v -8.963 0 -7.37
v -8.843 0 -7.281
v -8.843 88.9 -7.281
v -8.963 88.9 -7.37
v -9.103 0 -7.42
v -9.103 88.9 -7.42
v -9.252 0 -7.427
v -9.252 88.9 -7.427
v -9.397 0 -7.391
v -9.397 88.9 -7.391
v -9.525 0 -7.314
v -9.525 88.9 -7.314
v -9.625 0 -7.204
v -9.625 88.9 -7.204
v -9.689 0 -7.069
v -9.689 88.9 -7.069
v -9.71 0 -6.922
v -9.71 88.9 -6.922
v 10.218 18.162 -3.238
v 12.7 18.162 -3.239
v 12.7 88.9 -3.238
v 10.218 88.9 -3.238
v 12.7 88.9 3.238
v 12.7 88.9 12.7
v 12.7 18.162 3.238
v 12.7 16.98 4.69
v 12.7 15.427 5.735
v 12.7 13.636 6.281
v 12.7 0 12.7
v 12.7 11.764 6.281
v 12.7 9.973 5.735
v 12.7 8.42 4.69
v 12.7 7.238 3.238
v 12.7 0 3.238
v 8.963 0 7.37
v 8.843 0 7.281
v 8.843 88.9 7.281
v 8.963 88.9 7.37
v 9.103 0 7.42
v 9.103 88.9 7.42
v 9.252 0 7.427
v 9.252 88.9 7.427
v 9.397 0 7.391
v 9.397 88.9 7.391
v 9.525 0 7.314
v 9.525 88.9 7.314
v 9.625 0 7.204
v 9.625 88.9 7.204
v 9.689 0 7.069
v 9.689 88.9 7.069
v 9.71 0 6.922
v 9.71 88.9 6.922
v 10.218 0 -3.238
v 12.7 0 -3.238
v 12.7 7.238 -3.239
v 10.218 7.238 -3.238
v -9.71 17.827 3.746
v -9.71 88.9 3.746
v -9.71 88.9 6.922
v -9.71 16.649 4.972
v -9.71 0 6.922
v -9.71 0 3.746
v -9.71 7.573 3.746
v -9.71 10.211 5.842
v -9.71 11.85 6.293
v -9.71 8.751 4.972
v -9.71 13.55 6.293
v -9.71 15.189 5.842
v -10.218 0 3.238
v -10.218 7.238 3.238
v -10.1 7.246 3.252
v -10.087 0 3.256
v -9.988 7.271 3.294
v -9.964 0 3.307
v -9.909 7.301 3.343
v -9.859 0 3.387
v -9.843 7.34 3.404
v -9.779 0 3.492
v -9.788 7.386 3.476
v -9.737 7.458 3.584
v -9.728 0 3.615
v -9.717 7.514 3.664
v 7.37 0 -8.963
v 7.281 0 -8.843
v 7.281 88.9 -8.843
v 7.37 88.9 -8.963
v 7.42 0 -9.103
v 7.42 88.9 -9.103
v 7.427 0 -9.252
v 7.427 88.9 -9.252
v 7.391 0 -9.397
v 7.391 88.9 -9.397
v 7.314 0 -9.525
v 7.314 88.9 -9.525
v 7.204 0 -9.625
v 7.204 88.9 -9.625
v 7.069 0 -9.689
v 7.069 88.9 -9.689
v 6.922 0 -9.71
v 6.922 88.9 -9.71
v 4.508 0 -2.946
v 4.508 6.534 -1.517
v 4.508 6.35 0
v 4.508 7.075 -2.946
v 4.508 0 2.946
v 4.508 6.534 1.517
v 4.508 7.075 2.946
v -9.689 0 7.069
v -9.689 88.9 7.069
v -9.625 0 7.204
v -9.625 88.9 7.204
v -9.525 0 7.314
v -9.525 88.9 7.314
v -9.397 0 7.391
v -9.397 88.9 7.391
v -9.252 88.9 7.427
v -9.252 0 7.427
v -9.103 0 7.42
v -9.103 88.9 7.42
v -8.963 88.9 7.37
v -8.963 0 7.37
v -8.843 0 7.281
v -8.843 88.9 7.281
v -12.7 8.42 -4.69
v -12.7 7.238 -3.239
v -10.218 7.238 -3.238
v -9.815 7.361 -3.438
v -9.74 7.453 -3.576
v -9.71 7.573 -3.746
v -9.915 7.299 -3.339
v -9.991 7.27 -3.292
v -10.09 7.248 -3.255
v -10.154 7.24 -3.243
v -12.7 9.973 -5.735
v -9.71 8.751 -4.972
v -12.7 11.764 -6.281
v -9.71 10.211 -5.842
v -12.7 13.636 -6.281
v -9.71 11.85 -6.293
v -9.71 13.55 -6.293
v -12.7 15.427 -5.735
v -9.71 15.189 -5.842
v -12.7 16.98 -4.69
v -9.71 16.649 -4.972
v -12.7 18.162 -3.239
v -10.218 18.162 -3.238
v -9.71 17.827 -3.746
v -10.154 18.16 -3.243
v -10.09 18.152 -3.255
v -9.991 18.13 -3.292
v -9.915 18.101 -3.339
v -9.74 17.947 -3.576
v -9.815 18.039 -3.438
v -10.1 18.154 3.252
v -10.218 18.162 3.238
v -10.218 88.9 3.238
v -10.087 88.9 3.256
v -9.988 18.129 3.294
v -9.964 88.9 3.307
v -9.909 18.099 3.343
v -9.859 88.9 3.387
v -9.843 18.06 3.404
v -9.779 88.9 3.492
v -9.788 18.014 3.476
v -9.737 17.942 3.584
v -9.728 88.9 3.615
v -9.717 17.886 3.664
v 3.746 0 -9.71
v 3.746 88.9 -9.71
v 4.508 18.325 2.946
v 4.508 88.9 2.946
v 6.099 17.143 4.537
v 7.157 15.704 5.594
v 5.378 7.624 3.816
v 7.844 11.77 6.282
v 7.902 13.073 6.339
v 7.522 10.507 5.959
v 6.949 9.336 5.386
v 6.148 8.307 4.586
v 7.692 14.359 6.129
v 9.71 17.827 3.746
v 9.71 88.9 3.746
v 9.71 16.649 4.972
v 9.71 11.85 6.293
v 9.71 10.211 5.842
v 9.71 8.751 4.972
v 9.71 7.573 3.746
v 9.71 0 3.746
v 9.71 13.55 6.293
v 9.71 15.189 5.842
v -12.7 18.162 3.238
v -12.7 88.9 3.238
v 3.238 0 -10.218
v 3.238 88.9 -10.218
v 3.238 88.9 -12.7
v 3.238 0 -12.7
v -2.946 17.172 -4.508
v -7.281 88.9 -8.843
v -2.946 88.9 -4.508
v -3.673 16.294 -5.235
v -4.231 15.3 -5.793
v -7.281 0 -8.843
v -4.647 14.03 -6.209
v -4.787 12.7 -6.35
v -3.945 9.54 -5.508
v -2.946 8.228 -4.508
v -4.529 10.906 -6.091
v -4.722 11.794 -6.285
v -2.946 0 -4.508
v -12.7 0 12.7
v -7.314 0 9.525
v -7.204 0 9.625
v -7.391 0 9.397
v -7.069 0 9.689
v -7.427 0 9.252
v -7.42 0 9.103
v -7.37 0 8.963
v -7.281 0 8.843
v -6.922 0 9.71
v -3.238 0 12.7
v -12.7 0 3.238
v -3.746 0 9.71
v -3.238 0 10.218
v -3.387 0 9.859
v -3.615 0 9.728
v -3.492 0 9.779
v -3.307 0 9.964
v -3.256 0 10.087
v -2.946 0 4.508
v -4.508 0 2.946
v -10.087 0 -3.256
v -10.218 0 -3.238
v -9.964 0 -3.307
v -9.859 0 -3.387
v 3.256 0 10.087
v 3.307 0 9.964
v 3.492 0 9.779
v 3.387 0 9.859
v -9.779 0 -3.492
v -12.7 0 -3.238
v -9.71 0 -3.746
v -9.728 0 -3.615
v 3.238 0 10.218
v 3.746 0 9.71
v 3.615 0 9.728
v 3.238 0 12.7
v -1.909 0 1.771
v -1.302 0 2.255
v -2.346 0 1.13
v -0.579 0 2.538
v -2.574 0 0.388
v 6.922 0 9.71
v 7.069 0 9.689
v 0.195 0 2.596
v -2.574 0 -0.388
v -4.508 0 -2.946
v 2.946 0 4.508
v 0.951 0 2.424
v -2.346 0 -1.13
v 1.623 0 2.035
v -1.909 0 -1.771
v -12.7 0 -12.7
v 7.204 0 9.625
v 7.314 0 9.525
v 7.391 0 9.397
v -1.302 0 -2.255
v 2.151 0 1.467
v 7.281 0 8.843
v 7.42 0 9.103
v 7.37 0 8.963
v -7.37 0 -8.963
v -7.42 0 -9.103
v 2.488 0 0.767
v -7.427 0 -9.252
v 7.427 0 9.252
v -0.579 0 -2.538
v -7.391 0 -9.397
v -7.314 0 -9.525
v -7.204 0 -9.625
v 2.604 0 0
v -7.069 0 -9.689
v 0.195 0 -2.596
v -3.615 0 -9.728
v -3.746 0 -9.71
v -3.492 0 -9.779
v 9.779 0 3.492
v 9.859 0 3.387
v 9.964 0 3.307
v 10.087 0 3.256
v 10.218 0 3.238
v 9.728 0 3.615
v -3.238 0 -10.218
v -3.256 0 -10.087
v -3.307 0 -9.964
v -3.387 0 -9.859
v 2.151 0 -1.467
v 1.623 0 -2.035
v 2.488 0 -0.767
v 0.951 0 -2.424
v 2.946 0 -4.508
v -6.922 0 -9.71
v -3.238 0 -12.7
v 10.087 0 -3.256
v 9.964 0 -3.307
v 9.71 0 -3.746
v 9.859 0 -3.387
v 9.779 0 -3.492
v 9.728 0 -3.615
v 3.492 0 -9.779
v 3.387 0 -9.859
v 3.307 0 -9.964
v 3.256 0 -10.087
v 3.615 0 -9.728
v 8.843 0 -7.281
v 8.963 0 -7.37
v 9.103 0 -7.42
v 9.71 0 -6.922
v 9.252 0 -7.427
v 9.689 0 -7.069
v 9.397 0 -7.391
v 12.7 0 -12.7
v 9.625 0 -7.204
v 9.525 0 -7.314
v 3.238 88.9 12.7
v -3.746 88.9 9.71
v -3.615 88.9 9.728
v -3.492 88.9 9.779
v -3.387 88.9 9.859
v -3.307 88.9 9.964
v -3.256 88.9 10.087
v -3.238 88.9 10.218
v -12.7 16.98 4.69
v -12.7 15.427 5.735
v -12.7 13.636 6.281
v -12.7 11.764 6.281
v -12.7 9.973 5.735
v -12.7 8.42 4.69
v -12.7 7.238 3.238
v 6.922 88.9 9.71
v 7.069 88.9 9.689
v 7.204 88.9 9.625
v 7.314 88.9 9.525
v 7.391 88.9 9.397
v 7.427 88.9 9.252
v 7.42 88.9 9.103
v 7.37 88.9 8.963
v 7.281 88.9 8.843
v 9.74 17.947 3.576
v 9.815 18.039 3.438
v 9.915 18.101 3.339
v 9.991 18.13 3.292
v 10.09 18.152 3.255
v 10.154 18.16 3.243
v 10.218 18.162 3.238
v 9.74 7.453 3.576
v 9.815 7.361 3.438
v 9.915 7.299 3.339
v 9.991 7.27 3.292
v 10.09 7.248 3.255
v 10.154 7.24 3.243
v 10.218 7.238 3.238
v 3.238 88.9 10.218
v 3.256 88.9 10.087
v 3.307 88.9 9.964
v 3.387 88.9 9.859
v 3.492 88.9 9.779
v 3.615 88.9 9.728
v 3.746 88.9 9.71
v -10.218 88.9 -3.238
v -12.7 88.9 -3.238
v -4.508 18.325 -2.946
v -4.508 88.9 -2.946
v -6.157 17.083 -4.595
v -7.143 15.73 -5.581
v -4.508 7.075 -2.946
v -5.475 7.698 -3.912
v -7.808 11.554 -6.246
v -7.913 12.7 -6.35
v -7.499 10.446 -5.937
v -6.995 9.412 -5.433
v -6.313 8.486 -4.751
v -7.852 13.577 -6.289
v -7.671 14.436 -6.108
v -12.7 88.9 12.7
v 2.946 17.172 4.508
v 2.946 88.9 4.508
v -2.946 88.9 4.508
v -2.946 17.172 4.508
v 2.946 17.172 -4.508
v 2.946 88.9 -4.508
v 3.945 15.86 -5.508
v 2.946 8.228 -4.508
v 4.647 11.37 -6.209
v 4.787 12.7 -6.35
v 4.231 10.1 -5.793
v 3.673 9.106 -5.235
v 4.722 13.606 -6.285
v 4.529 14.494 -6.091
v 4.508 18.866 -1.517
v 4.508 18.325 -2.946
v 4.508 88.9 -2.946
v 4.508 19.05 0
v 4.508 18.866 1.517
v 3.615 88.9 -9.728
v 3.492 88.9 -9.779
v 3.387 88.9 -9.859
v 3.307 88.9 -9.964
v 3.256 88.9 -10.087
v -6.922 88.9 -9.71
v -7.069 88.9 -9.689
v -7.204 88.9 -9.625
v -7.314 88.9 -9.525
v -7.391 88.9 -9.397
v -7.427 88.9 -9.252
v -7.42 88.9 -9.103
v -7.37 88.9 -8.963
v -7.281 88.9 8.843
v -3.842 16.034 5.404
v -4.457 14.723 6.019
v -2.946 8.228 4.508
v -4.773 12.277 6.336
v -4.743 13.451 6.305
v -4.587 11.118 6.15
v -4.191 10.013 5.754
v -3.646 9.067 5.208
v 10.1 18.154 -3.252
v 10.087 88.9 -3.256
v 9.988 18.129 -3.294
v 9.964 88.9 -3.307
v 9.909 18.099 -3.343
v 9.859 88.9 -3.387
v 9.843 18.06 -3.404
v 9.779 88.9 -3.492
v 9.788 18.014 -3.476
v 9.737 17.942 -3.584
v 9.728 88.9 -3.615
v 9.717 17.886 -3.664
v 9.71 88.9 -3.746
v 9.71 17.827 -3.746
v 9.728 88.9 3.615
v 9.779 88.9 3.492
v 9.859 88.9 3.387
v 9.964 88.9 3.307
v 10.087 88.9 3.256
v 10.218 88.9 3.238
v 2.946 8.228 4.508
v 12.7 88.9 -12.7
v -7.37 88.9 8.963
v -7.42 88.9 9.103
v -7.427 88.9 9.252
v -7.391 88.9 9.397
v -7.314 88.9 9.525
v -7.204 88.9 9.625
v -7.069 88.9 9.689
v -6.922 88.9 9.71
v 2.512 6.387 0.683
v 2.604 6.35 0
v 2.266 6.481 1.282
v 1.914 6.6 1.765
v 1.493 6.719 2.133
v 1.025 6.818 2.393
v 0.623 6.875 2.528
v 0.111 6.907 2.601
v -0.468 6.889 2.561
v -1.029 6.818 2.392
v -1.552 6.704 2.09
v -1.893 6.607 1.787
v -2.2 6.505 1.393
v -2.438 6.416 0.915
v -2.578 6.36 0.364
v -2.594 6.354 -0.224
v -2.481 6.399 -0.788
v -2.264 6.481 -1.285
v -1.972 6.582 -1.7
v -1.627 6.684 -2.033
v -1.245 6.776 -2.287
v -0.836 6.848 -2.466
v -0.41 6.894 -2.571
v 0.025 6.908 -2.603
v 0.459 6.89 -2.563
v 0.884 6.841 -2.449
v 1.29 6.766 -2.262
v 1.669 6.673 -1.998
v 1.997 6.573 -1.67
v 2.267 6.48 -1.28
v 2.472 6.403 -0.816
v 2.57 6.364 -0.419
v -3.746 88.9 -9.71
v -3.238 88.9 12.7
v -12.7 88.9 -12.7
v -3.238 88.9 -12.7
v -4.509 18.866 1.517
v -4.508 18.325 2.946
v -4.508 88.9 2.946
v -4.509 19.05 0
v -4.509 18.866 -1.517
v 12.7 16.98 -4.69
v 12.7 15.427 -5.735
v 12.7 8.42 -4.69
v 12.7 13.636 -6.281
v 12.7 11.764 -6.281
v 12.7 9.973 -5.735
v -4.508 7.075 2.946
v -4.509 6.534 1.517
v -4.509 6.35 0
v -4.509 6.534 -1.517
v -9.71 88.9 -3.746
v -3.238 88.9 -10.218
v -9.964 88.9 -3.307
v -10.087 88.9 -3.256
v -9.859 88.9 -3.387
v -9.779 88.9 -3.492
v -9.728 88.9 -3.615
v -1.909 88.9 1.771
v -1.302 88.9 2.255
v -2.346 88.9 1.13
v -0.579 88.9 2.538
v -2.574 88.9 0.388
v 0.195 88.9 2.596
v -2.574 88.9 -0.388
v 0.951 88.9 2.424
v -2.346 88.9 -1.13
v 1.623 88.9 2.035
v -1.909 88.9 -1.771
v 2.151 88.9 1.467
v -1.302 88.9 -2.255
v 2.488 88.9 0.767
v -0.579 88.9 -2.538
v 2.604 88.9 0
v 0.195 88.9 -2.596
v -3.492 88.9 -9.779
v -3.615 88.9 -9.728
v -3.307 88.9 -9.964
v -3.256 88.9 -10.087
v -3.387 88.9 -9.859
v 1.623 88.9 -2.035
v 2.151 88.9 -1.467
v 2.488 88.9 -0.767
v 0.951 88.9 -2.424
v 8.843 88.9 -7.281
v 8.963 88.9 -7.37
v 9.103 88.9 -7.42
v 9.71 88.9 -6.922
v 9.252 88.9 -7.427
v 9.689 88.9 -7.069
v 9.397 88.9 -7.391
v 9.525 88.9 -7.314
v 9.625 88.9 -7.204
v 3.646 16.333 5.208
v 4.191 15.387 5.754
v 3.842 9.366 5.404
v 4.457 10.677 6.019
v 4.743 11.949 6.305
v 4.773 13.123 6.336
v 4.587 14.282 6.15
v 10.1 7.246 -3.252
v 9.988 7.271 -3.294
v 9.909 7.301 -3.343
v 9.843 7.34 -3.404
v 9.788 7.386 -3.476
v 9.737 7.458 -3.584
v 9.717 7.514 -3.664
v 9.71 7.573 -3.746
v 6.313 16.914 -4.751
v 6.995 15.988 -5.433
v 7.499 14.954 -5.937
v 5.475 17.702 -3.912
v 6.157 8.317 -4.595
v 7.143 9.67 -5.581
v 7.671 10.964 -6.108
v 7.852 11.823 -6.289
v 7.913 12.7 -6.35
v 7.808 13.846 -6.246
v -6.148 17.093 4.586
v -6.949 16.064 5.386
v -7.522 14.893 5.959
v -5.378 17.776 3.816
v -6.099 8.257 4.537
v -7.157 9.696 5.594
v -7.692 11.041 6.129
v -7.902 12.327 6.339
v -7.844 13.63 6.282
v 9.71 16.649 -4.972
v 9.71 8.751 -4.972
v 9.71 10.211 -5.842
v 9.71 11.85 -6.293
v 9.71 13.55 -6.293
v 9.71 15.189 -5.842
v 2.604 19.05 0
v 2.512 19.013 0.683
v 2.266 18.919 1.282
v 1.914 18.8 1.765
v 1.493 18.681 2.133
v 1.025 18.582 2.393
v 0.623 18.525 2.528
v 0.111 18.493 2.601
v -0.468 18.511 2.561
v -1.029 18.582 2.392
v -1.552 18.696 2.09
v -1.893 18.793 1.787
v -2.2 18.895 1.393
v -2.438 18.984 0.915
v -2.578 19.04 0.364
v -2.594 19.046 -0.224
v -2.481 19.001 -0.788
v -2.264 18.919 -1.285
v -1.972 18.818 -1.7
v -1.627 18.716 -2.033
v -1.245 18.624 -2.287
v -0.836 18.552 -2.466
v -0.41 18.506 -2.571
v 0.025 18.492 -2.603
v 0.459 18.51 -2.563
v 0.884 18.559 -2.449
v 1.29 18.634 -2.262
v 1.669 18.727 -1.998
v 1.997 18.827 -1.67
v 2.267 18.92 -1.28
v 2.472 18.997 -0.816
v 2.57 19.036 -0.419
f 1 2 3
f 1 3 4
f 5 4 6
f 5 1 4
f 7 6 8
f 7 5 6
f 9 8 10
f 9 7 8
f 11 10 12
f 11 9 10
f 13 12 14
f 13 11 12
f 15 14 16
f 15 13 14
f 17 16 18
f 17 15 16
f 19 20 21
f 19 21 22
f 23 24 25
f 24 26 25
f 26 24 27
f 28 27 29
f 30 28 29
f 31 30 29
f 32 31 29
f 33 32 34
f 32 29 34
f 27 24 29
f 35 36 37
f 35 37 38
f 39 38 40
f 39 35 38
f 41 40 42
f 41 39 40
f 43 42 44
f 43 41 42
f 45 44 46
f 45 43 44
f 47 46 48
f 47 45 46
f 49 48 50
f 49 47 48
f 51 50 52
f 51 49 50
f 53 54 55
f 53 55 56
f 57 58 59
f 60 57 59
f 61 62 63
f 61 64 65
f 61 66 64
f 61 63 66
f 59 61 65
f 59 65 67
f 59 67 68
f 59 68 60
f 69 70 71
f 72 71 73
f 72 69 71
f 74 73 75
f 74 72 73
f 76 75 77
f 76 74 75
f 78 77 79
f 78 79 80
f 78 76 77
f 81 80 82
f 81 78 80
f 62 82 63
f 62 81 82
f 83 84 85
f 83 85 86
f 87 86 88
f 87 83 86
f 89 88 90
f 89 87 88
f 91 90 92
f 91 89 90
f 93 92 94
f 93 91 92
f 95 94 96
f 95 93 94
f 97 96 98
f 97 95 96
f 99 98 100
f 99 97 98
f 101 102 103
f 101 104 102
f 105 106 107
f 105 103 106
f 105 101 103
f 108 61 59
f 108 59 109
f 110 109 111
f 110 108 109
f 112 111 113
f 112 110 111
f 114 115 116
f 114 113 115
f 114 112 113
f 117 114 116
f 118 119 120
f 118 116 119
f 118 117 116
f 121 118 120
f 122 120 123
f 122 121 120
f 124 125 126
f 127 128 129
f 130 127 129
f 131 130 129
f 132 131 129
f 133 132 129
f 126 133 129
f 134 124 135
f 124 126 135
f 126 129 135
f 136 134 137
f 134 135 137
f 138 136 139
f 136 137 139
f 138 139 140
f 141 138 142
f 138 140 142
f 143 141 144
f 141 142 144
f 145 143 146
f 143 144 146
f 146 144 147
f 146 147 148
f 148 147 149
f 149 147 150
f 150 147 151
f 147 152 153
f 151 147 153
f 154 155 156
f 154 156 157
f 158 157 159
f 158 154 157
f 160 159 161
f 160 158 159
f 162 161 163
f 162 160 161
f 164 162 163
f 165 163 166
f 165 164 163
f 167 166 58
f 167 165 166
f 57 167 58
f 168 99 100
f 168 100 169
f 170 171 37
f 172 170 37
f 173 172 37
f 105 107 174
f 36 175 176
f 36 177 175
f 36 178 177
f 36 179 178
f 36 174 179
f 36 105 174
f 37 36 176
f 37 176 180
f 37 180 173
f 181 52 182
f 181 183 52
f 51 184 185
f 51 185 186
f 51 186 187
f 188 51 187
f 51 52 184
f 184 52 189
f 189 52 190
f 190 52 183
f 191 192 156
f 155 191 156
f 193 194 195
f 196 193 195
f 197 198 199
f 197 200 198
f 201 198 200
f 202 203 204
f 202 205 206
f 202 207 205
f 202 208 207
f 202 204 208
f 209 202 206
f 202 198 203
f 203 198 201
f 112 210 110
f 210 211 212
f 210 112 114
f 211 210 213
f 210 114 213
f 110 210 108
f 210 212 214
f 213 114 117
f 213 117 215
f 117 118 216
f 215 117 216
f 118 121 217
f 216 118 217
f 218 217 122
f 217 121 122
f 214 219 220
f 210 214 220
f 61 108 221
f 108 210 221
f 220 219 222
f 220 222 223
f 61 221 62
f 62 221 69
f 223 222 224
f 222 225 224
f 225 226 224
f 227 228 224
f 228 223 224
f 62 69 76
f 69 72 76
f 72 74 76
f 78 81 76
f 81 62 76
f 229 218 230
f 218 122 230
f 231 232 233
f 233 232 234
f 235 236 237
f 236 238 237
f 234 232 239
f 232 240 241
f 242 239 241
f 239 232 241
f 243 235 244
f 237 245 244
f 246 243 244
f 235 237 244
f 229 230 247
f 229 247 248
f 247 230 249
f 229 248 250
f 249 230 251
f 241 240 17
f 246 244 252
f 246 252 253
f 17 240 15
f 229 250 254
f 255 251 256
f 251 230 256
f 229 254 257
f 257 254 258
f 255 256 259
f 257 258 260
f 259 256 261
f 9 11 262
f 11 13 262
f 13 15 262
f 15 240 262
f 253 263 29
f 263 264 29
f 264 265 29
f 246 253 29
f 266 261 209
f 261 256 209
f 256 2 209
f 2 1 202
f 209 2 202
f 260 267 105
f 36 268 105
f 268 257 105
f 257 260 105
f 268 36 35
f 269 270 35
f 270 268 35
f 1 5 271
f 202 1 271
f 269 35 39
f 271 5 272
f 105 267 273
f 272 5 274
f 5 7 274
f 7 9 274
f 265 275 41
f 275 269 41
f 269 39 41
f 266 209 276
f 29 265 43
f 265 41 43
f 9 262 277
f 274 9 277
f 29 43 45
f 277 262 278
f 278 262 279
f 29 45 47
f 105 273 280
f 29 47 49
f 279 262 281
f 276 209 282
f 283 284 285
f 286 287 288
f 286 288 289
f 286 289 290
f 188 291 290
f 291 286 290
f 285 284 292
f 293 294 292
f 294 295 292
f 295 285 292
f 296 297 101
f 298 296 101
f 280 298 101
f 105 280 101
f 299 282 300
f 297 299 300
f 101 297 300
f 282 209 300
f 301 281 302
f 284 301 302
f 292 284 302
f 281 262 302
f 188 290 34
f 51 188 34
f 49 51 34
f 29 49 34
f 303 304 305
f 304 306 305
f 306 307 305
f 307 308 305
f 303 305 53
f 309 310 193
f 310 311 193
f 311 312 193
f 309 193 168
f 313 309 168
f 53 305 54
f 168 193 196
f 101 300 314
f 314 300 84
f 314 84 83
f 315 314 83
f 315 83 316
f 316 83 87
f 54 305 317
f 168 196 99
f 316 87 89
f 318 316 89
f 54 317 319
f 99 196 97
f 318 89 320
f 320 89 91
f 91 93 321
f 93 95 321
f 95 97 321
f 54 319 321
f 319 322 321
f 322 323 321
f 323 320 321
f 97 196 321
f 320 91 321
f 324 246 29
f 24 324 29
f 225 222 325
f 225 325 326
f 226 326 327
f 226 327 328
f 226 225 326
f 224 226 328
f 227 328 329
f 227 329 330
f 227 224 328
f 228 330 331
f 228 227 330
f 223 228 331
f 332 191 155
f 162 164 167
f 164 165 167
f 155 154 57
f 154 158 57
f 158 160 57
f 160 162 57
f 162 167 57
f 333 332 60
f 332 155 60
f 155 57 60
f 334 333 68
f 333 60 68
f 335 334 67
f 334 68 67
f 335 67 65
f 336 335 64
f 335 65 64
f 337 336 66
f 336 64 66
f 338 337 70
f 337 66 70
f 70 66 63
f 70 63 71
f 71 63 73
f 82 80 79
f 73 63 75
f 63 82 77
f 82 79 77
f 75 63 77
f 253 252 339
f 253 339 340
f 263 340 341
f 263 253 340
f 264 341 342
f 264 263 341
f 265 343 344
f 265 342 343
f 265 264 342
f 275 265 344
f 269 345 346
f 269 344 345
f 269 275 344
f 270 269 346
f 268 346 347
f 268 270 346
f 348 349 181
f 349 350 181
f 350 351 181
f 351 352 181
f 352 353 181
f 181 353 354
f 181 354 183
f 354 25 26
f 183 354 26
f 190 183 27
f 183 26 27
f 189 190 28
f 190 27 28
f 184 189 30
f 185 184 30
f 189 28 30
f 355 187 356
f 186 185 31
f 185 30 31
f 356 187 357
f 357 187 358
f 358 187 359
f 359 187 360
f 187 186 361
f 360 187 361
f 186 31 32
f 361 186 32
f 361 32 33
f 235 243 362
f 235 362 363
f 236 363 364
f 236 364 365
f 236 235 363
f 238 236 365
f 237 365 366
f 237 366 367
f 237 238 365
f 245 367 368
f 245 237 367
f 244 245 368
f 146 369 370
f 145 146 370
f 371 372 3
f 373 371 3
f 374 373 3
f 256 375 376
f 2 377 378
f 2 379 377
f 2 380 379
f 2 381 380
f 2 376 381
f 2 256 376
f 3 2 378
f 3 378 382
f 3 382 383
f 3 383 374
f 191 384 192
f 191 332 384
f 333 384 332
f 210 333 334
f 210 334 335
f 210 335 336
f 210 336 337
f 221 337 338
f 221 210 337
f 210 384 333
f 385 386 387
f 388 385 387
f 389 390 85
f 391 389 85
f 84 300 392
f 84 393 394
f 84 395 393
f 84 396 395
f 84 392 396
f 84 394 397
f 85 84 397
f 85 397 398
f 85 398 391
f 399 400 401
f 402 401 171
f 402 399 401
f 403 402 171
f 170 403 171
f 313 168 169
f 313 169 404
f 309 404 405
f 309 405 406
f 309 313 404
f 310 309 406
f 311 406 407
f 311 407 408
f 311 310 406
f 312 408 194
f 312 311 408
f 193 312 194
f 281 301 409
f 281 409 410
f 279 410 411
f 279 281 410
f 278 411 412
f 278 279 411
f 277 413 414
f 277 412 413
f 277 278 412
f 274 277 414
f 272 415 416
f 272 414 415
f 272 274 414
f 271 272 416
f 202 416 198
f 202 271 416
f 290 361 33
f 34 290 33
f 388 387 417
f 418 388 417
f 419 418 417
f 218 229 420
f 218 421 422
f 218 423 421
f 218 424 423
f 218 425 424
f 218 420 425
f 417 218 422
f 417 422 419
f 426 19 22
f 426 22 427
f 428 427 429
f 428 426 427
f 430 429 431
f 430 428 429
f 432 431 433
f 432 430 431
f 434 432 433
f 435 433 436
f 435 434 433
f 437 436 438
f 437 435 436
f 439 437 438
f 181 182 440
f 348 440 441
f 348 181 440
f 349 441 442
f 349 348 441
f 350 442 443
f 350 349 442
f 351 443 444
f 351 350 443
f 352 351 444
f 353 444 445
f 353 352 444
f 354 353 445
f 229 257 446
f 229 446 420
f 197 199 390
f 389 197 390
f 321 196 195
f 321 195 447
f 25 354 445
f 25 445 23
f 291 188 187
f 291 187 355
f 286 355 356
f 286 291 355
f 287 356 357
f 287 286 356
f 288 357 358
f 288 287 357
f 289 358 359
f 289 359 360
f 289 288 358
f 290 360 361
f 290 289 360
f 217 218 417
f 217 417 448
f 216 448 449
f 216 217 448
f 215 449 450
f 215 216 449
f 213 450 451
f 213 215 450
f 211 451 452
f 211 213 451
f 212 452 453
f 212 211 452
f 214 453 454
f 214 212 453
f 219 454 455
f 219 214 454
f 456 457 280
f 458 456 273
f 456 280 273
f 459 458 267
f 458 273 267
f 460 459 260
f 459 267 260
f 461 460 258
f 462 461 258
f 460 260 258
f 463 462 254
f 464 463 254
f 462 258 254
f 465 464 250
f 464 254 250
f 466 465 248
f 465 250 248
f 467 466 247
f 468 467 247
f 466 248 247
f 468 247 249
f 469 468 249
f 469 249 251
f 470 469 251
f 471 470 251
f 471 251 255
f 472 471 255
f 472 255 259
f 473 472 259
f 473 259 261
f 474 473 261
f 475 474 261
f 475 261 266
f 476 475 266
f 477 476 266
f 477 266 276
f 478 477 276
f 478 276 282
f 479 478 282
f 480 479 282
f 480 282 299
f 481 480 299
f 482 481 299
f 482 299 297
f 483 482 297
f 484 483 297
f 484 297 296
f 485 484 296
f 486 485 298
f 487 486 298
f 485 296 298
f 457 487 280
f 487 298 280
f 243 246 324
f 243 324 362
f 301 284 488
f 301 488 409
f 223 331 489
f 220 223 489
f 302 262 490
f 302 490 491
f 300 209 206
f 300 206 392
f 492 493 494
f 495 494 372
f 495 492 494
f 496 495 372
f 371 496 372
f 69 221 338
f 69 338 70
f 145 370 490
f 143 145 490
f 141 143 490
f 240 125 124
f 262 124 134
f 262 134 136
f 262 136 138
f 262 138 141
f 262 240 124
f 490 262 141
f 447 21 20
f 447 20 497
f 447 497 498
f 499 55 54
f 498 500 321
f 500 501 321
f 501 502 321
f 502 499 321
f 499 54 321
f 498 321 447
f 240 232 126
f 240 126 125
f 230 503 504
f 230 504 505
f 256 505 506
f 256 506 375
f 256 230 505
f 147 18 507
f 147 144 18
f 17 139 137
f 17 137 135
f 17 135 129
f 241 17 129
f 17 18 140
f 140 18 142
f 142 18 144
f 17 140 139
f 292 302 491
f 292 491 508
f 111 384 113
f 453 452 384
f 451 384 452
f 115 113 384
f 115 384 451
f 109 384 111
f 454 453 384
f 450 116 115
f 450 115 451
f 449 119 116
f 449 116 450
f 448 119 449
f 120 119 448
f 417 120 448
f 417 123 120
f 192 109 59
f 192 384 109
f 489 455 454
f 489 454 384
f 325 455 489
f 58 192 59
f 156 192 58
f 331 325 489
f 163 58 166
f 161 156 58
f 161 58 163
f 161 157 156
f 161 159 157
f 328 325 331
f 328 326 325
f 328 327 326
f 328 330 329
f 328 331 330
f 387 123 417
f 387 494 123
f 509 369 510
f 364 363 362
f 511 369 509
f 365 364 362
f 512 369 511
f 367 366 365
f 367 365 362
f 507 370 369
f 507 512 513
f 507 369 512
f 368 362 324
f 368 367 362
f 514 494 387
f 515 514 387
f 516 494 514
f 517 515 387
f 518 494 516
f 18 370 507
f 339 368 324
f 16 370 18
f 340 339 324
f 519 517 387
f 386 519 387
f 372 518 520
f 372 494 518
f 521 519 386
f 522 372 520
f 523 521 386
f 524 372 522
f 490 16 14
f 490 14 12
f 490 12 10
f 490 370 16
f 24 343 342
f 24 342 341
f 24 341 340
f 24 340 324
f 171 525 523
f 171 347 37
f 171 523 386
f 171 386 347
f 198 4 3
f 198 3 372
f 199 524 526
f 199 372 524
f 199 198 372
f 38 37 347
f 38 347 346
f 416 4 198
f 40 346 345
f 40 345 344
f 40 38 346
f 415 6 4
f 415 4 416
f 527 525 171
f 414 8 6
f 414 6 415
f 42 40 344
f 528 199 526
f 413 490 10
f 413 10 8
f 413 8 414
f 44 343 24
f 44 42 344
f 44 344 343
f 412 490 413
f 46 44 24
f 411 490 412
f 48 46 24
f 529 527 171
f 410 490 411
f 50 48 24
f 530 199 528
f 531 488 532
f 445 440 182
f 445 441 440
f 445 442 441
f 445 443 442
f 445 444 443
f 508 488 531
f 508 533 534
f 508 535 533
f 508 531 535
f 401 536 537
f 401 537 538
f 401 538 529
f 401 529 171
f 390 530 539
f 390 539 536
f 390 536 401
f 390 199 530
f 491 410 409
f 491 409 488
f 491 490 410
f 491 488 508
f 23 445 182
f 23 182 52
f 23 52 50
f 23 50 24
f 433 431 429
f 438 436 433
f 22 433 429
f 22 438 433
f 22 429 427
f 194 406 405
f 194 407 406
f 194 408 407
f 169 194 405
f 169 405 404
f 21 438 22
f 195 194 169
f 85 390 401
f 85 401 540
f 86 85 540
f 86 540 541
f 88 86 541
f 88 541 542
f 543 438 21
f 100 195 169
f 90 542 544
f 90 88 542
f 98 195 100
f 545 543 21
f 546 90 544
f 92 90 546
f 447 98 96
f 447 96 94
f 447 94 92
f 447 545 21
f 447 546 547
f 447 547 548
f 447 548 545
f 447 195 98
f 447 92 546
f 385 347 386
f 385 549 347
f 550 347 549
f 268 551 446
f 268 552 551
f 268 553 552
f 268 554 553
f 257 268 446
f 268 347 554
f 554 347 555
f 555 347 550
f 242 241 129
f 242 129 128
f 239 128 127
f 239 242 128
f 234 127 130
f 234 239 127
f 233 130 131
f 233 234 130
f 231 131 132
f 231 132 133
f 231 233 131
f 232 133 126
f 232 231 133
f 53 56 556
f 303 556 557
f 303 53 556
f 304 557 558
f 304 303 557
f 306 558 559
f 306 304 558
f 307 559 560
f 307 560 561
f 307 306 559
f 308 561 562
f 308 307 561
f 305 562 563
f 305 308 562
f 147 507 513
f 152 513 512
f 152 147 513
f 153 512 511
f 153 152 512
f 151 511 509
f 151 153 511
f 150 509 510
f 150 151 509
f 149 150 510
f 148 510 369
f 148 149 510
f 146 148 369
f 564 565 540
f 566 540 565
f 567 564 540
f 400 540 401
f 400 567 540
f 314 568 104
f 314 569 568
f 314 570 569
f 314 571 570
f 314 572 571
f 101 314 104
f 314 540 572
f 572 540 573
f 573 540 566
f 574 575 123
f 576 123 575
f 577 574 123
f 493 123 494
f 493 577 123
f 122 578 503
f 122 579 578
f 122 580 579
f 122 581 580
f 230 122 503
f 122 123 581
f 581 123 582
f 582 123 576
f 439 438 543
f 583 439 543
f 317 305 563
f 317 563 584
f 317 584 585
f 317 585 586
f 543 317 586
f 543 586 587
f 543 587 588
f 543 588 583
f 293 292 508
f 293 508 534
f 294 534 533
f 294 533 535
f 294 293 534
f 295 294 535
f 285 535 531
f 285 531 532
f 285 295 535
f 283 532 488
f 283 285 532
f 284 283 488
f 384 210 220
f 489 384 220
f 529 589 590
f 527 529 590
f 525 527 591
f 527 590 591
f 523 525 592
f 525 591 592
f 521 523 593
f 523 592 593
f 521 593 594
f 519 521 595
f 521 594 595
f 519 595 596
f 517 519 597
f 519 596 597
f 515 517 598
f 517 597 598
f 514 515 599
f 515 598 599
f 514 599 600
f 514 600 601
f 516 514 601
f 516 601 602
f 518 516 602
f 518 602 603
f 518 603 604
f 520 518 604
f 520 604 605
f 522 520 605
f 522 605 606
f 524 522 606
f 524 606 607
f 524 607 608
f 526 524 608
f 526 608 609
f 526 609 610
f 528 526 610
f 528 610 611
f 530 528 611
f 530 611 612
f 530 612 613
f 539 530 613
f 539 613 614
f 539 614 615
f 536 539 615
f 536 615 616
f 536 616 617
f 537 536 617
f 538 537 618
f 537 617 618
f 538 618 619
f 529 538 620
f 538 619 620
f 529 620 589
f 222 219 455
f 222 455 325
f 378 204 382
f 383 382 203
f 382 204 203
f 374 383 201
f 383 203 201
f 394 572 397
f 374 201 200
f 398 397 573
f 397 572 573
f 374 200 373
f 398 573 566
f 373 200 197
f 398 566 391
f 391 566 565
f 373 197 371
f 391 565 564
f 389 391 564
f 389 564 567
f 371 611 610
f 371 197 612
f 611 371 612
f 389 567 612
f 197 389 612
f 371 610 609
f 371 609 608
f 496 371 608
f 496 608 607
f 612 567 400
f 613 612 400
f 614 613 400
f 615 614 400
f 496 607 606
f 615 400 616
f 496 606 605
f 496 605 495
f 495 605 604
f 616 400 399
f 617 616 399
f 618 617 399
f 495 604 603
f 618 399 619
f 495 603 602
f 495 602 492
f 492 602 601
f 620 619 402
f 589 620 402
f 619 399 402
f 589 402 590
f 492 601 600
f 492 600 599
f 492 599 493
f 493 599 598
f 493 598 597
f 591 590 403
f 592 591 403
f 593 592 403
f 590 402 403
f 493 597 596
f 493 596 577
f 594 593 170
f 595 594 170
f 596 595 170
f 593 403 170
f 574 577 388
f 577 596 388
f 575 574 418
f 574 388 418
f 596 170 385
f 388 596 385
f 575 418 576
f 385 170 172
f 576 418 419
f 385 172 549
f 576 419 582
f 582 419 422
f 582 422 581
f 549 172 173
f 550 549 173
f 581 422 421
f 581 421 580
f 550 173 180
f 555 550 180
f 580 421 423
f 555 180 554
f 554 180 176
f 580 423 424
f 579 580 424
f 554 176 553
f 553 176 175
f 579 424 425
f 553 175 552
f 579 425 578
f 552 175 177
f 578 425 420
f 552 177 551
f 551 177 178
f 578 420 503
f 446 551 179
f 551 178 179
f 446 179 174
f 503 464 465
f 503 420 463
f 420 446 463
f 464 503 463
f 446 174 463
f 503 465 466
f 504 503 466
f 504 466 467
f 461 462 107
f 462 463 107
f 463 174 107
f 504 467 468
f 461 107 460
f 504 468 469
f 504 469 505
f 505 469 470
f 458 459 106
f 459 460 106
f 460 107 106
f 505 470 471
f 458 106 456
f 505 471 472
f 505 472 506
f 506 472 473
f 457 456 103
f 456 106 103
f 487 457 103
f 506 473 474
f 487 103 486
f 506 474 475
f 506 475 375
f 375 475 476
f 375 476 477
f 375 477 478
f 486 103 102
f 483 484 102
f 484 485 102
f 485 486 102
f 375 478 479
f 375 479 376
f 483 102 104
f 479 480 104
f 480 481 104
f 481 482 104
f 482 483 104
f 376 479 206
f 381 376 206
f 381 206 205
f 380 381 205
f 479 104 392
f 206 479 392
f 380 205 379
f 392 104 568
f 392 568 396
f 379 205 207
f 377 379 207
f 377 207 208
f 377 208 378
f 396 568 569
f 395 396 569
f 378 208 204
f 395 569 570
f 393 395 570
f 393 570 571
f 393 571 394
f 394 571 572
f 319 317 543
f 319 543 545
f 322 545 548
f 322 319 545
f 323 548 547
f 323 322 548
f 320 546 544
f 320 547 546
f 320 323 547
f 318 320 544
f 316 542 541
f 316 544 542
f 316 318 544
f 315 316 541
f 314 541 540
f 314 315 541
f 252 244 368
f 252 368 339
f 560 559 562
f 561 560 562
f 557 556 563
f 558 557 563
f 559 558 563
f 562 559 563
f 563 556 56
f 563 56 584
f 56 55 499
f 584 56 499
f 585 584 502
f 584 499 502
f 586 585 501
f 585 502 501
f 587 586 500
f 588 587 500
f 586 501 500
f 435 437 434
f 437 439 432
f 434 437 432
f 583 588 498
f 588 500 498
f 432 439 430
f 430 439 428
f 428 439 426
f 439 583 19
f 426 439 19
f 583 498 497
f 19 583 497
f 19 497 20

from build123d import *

# Parameters (mm, degrees)
SKETCH1_W           = 25.4
SKETCH1_H           = 25.4
BOSS_EXTRUDE1_DEPTH = 88.9
SKETCH2_R           = 6.35
CUT_EXTRUDE1_DEPTH  = 26.4
SKETCH4_R           = 2.6035
CUT_EXTRUDE2_DEPTH  = 89.9


with BuildPart() as part:
    # Sketch1 → Boss-Extrude1 (new body)
    with BuildSketch(Plane(origin=(0, 0, 0), x_dir=(1, 0, 0), z_dir=(0, 1, 0))):
        Rectangle(SKETCH1_W, SKETCH1_H)
    extrude(amount=BOSS_EXTRUDE1_DEPTH)

    # Sketch2 → Cut-Extrude1 (cut, through all)
    with BuildSketch(Plane(origin=(12.7, 0, 0), x_dir=(0, 0, -1), z_dir=(1, 0, 0))):
        with Locations((0, 12.7)):
            Circle(SKETCH2_R)
    extrude(amount=-CUT_EXTRUDE1_DEPTH, mode=Mode.SUBTRACT)

    # Sketch4 → Cut-Extrude2 (cut, through all)
    with BuildSketch(Plane.XZ):
        Circle(SKETCH4_R)
        with BuildLine():
            Line((-3.2385, 12.7), (3.2385, 12.7))
            Line((3.2385, 12.7), (3.2385, 10.218485055))
            ThreePointArc((3.2385, 10.218485055), (3.387289755, 9.85927481), (3.7465, 9.710485055))
            Line((3.7465, 9.710485055), (6.9215, 9.710485055))
            ThreePointArc((6.9215, 9.710485055), (7.390830803, 9.396888238), (7.280710245, 8.84327481))
            Line((7.280710245, 8.84327481), (2.945935435, 4.5085))
            Line((2.945935435, 4.5085), (-2.945935435, 4.5085))
            Line((-2.945935435, 4.5085), (-7.280710245, 8.84327481))
            ThreePointArc((-7.280710245, 8.84327481), (-7.390830803, 9.396888238), (-6.9215, 9.710485055))
            Line((-6.9215, 9.710485055), (-3.7465, 9.710485055))
            ThreePointArc((-3.7465, 9.710485055), (-3.387289755, 9.85927481), (-3.2385, 10.218485055))
            Line((-3.2385, 10.218485055), (-3.2385, 12.7))
        make_face()
        with BuildLine():
            Line((12.7, 3.2385), (12.7, -3.2385))
            Line((12.7, -3.2385), (10.218485055, -3.2385))
            ThreePointArc((10.218485055, -3.2385), (9.85927481, -3.387289755), (9.710485055, -3.7465))
            Line((9.710485055, -3.7465), (9.710485055, -6.9215))
            ThreePointArc((9.710485055, -6.9215), (9.396888238, -7.390830803), (8.84327481, -7.280710245))
            Line((8.84327481, -7.280710245), (4.5085, -2.945935435))
            Line((4.5085, -2.945935435), (4.5085, 2.945935435))
            Line((4.5085, 2.945935435), (8.84327481, 7.280710245))
            ThreePointArc((8.84327481, 7.280710245), (9.396888238, 7.390830803), (9.710485055, 6.9215))
            Line((9.710485055, 6.9215), (9.710485055, 3.7465))
            ThreePointArc((9.710485055, 3.7465), (9.85927481, 3.387289755), (10.218485055, 3.2385))
            Line((10.218485055, 3.2385), (12.7, 3.2385))
        make_face()
        with BuildLine():
            Line((3.2385, -12.7), (-3.2385, -12.7))
            Line((-3.2385, -12.7), (-3.2385, -10.218485055))
            ThreePointArc((-3.2385, -10.218485055), (-3.387289755, -9.85927481), (-3.7465, -9.710485055))
            Line((-3.7465, -9.710485055), (-6.9215, -9.710485055))
            ThreePointArc((-6.9215, -9.710485055), (-7.390830803, -9.396888238), (-7.280710245, -8.84327481))
            Line((-7.280710245, -8.84327481), (-2.945935435, -4.5085))
            Line((-2.945935435, -4.5085), (2.945935435, -4.5085))
            Line((2.945935435, -4.5085), (7.280710245, -8.84327481))
            ThreePointArc((7.280710245, -8.84327481), (7.390830803, -9.396888238), (6.9215, -9.710485055))
            Line((6.9215, -9.710485055), (3.7465, -9.710485055))
            ThreePointArc((3.7465, -9.710485055), (3.387289755, -9.85927481), (3.2385, -10.218485055))
            Line((3.2385, -10.218485055), (3.2385, -12.7))
        make_face()
        with BuildLine():
            Line((-12.7, -3.2385), (-12.7, 3.2385))
            Line((-12.7, 3.2385), (-10.218485055, 3.2385))
            ThreePointArc((-10.218485055, 3.2385), (-9.85927481, 3.387289755), (-9.710485055, 3.7465))
            Line((-9.710485055, 3.7465), (-9.710485055, 6.9215))
            ThreePointArc((-9.710485055, 6.9215), (-9.396888238, 7.390830803), (-8.84327481, 7.280710245))
            Line((-8.84327481, 7.280710245), (-4.5085, 2.945935435))
            Line((-4.5085, 2.945935435), (-4.5085, -2.945935435))
            Line((-4.5085, -2.945935435), (-8.84327481, -7.280710245))
            ThreePointArc((-8.84327481, -7.280710245), (-9.396888238, -7.390830803), (-9.710485055, -6.9215))
            Line((-9.710485055, -6.9215), (-9.710485055, -3.7465))
            ThreePointArc((-9.710485055, -3.7465), (-9.85927481, -3.387289755), (-10.218485055, -3.2385))
            Line((-10.218485055, -3.2385), (-12.7, -3.2385))
        make_face()
    extrude(amount=-CUT_EXTRUDE2_DEPTH, mode=Mode.SUBTRACT)


solid = part.part
